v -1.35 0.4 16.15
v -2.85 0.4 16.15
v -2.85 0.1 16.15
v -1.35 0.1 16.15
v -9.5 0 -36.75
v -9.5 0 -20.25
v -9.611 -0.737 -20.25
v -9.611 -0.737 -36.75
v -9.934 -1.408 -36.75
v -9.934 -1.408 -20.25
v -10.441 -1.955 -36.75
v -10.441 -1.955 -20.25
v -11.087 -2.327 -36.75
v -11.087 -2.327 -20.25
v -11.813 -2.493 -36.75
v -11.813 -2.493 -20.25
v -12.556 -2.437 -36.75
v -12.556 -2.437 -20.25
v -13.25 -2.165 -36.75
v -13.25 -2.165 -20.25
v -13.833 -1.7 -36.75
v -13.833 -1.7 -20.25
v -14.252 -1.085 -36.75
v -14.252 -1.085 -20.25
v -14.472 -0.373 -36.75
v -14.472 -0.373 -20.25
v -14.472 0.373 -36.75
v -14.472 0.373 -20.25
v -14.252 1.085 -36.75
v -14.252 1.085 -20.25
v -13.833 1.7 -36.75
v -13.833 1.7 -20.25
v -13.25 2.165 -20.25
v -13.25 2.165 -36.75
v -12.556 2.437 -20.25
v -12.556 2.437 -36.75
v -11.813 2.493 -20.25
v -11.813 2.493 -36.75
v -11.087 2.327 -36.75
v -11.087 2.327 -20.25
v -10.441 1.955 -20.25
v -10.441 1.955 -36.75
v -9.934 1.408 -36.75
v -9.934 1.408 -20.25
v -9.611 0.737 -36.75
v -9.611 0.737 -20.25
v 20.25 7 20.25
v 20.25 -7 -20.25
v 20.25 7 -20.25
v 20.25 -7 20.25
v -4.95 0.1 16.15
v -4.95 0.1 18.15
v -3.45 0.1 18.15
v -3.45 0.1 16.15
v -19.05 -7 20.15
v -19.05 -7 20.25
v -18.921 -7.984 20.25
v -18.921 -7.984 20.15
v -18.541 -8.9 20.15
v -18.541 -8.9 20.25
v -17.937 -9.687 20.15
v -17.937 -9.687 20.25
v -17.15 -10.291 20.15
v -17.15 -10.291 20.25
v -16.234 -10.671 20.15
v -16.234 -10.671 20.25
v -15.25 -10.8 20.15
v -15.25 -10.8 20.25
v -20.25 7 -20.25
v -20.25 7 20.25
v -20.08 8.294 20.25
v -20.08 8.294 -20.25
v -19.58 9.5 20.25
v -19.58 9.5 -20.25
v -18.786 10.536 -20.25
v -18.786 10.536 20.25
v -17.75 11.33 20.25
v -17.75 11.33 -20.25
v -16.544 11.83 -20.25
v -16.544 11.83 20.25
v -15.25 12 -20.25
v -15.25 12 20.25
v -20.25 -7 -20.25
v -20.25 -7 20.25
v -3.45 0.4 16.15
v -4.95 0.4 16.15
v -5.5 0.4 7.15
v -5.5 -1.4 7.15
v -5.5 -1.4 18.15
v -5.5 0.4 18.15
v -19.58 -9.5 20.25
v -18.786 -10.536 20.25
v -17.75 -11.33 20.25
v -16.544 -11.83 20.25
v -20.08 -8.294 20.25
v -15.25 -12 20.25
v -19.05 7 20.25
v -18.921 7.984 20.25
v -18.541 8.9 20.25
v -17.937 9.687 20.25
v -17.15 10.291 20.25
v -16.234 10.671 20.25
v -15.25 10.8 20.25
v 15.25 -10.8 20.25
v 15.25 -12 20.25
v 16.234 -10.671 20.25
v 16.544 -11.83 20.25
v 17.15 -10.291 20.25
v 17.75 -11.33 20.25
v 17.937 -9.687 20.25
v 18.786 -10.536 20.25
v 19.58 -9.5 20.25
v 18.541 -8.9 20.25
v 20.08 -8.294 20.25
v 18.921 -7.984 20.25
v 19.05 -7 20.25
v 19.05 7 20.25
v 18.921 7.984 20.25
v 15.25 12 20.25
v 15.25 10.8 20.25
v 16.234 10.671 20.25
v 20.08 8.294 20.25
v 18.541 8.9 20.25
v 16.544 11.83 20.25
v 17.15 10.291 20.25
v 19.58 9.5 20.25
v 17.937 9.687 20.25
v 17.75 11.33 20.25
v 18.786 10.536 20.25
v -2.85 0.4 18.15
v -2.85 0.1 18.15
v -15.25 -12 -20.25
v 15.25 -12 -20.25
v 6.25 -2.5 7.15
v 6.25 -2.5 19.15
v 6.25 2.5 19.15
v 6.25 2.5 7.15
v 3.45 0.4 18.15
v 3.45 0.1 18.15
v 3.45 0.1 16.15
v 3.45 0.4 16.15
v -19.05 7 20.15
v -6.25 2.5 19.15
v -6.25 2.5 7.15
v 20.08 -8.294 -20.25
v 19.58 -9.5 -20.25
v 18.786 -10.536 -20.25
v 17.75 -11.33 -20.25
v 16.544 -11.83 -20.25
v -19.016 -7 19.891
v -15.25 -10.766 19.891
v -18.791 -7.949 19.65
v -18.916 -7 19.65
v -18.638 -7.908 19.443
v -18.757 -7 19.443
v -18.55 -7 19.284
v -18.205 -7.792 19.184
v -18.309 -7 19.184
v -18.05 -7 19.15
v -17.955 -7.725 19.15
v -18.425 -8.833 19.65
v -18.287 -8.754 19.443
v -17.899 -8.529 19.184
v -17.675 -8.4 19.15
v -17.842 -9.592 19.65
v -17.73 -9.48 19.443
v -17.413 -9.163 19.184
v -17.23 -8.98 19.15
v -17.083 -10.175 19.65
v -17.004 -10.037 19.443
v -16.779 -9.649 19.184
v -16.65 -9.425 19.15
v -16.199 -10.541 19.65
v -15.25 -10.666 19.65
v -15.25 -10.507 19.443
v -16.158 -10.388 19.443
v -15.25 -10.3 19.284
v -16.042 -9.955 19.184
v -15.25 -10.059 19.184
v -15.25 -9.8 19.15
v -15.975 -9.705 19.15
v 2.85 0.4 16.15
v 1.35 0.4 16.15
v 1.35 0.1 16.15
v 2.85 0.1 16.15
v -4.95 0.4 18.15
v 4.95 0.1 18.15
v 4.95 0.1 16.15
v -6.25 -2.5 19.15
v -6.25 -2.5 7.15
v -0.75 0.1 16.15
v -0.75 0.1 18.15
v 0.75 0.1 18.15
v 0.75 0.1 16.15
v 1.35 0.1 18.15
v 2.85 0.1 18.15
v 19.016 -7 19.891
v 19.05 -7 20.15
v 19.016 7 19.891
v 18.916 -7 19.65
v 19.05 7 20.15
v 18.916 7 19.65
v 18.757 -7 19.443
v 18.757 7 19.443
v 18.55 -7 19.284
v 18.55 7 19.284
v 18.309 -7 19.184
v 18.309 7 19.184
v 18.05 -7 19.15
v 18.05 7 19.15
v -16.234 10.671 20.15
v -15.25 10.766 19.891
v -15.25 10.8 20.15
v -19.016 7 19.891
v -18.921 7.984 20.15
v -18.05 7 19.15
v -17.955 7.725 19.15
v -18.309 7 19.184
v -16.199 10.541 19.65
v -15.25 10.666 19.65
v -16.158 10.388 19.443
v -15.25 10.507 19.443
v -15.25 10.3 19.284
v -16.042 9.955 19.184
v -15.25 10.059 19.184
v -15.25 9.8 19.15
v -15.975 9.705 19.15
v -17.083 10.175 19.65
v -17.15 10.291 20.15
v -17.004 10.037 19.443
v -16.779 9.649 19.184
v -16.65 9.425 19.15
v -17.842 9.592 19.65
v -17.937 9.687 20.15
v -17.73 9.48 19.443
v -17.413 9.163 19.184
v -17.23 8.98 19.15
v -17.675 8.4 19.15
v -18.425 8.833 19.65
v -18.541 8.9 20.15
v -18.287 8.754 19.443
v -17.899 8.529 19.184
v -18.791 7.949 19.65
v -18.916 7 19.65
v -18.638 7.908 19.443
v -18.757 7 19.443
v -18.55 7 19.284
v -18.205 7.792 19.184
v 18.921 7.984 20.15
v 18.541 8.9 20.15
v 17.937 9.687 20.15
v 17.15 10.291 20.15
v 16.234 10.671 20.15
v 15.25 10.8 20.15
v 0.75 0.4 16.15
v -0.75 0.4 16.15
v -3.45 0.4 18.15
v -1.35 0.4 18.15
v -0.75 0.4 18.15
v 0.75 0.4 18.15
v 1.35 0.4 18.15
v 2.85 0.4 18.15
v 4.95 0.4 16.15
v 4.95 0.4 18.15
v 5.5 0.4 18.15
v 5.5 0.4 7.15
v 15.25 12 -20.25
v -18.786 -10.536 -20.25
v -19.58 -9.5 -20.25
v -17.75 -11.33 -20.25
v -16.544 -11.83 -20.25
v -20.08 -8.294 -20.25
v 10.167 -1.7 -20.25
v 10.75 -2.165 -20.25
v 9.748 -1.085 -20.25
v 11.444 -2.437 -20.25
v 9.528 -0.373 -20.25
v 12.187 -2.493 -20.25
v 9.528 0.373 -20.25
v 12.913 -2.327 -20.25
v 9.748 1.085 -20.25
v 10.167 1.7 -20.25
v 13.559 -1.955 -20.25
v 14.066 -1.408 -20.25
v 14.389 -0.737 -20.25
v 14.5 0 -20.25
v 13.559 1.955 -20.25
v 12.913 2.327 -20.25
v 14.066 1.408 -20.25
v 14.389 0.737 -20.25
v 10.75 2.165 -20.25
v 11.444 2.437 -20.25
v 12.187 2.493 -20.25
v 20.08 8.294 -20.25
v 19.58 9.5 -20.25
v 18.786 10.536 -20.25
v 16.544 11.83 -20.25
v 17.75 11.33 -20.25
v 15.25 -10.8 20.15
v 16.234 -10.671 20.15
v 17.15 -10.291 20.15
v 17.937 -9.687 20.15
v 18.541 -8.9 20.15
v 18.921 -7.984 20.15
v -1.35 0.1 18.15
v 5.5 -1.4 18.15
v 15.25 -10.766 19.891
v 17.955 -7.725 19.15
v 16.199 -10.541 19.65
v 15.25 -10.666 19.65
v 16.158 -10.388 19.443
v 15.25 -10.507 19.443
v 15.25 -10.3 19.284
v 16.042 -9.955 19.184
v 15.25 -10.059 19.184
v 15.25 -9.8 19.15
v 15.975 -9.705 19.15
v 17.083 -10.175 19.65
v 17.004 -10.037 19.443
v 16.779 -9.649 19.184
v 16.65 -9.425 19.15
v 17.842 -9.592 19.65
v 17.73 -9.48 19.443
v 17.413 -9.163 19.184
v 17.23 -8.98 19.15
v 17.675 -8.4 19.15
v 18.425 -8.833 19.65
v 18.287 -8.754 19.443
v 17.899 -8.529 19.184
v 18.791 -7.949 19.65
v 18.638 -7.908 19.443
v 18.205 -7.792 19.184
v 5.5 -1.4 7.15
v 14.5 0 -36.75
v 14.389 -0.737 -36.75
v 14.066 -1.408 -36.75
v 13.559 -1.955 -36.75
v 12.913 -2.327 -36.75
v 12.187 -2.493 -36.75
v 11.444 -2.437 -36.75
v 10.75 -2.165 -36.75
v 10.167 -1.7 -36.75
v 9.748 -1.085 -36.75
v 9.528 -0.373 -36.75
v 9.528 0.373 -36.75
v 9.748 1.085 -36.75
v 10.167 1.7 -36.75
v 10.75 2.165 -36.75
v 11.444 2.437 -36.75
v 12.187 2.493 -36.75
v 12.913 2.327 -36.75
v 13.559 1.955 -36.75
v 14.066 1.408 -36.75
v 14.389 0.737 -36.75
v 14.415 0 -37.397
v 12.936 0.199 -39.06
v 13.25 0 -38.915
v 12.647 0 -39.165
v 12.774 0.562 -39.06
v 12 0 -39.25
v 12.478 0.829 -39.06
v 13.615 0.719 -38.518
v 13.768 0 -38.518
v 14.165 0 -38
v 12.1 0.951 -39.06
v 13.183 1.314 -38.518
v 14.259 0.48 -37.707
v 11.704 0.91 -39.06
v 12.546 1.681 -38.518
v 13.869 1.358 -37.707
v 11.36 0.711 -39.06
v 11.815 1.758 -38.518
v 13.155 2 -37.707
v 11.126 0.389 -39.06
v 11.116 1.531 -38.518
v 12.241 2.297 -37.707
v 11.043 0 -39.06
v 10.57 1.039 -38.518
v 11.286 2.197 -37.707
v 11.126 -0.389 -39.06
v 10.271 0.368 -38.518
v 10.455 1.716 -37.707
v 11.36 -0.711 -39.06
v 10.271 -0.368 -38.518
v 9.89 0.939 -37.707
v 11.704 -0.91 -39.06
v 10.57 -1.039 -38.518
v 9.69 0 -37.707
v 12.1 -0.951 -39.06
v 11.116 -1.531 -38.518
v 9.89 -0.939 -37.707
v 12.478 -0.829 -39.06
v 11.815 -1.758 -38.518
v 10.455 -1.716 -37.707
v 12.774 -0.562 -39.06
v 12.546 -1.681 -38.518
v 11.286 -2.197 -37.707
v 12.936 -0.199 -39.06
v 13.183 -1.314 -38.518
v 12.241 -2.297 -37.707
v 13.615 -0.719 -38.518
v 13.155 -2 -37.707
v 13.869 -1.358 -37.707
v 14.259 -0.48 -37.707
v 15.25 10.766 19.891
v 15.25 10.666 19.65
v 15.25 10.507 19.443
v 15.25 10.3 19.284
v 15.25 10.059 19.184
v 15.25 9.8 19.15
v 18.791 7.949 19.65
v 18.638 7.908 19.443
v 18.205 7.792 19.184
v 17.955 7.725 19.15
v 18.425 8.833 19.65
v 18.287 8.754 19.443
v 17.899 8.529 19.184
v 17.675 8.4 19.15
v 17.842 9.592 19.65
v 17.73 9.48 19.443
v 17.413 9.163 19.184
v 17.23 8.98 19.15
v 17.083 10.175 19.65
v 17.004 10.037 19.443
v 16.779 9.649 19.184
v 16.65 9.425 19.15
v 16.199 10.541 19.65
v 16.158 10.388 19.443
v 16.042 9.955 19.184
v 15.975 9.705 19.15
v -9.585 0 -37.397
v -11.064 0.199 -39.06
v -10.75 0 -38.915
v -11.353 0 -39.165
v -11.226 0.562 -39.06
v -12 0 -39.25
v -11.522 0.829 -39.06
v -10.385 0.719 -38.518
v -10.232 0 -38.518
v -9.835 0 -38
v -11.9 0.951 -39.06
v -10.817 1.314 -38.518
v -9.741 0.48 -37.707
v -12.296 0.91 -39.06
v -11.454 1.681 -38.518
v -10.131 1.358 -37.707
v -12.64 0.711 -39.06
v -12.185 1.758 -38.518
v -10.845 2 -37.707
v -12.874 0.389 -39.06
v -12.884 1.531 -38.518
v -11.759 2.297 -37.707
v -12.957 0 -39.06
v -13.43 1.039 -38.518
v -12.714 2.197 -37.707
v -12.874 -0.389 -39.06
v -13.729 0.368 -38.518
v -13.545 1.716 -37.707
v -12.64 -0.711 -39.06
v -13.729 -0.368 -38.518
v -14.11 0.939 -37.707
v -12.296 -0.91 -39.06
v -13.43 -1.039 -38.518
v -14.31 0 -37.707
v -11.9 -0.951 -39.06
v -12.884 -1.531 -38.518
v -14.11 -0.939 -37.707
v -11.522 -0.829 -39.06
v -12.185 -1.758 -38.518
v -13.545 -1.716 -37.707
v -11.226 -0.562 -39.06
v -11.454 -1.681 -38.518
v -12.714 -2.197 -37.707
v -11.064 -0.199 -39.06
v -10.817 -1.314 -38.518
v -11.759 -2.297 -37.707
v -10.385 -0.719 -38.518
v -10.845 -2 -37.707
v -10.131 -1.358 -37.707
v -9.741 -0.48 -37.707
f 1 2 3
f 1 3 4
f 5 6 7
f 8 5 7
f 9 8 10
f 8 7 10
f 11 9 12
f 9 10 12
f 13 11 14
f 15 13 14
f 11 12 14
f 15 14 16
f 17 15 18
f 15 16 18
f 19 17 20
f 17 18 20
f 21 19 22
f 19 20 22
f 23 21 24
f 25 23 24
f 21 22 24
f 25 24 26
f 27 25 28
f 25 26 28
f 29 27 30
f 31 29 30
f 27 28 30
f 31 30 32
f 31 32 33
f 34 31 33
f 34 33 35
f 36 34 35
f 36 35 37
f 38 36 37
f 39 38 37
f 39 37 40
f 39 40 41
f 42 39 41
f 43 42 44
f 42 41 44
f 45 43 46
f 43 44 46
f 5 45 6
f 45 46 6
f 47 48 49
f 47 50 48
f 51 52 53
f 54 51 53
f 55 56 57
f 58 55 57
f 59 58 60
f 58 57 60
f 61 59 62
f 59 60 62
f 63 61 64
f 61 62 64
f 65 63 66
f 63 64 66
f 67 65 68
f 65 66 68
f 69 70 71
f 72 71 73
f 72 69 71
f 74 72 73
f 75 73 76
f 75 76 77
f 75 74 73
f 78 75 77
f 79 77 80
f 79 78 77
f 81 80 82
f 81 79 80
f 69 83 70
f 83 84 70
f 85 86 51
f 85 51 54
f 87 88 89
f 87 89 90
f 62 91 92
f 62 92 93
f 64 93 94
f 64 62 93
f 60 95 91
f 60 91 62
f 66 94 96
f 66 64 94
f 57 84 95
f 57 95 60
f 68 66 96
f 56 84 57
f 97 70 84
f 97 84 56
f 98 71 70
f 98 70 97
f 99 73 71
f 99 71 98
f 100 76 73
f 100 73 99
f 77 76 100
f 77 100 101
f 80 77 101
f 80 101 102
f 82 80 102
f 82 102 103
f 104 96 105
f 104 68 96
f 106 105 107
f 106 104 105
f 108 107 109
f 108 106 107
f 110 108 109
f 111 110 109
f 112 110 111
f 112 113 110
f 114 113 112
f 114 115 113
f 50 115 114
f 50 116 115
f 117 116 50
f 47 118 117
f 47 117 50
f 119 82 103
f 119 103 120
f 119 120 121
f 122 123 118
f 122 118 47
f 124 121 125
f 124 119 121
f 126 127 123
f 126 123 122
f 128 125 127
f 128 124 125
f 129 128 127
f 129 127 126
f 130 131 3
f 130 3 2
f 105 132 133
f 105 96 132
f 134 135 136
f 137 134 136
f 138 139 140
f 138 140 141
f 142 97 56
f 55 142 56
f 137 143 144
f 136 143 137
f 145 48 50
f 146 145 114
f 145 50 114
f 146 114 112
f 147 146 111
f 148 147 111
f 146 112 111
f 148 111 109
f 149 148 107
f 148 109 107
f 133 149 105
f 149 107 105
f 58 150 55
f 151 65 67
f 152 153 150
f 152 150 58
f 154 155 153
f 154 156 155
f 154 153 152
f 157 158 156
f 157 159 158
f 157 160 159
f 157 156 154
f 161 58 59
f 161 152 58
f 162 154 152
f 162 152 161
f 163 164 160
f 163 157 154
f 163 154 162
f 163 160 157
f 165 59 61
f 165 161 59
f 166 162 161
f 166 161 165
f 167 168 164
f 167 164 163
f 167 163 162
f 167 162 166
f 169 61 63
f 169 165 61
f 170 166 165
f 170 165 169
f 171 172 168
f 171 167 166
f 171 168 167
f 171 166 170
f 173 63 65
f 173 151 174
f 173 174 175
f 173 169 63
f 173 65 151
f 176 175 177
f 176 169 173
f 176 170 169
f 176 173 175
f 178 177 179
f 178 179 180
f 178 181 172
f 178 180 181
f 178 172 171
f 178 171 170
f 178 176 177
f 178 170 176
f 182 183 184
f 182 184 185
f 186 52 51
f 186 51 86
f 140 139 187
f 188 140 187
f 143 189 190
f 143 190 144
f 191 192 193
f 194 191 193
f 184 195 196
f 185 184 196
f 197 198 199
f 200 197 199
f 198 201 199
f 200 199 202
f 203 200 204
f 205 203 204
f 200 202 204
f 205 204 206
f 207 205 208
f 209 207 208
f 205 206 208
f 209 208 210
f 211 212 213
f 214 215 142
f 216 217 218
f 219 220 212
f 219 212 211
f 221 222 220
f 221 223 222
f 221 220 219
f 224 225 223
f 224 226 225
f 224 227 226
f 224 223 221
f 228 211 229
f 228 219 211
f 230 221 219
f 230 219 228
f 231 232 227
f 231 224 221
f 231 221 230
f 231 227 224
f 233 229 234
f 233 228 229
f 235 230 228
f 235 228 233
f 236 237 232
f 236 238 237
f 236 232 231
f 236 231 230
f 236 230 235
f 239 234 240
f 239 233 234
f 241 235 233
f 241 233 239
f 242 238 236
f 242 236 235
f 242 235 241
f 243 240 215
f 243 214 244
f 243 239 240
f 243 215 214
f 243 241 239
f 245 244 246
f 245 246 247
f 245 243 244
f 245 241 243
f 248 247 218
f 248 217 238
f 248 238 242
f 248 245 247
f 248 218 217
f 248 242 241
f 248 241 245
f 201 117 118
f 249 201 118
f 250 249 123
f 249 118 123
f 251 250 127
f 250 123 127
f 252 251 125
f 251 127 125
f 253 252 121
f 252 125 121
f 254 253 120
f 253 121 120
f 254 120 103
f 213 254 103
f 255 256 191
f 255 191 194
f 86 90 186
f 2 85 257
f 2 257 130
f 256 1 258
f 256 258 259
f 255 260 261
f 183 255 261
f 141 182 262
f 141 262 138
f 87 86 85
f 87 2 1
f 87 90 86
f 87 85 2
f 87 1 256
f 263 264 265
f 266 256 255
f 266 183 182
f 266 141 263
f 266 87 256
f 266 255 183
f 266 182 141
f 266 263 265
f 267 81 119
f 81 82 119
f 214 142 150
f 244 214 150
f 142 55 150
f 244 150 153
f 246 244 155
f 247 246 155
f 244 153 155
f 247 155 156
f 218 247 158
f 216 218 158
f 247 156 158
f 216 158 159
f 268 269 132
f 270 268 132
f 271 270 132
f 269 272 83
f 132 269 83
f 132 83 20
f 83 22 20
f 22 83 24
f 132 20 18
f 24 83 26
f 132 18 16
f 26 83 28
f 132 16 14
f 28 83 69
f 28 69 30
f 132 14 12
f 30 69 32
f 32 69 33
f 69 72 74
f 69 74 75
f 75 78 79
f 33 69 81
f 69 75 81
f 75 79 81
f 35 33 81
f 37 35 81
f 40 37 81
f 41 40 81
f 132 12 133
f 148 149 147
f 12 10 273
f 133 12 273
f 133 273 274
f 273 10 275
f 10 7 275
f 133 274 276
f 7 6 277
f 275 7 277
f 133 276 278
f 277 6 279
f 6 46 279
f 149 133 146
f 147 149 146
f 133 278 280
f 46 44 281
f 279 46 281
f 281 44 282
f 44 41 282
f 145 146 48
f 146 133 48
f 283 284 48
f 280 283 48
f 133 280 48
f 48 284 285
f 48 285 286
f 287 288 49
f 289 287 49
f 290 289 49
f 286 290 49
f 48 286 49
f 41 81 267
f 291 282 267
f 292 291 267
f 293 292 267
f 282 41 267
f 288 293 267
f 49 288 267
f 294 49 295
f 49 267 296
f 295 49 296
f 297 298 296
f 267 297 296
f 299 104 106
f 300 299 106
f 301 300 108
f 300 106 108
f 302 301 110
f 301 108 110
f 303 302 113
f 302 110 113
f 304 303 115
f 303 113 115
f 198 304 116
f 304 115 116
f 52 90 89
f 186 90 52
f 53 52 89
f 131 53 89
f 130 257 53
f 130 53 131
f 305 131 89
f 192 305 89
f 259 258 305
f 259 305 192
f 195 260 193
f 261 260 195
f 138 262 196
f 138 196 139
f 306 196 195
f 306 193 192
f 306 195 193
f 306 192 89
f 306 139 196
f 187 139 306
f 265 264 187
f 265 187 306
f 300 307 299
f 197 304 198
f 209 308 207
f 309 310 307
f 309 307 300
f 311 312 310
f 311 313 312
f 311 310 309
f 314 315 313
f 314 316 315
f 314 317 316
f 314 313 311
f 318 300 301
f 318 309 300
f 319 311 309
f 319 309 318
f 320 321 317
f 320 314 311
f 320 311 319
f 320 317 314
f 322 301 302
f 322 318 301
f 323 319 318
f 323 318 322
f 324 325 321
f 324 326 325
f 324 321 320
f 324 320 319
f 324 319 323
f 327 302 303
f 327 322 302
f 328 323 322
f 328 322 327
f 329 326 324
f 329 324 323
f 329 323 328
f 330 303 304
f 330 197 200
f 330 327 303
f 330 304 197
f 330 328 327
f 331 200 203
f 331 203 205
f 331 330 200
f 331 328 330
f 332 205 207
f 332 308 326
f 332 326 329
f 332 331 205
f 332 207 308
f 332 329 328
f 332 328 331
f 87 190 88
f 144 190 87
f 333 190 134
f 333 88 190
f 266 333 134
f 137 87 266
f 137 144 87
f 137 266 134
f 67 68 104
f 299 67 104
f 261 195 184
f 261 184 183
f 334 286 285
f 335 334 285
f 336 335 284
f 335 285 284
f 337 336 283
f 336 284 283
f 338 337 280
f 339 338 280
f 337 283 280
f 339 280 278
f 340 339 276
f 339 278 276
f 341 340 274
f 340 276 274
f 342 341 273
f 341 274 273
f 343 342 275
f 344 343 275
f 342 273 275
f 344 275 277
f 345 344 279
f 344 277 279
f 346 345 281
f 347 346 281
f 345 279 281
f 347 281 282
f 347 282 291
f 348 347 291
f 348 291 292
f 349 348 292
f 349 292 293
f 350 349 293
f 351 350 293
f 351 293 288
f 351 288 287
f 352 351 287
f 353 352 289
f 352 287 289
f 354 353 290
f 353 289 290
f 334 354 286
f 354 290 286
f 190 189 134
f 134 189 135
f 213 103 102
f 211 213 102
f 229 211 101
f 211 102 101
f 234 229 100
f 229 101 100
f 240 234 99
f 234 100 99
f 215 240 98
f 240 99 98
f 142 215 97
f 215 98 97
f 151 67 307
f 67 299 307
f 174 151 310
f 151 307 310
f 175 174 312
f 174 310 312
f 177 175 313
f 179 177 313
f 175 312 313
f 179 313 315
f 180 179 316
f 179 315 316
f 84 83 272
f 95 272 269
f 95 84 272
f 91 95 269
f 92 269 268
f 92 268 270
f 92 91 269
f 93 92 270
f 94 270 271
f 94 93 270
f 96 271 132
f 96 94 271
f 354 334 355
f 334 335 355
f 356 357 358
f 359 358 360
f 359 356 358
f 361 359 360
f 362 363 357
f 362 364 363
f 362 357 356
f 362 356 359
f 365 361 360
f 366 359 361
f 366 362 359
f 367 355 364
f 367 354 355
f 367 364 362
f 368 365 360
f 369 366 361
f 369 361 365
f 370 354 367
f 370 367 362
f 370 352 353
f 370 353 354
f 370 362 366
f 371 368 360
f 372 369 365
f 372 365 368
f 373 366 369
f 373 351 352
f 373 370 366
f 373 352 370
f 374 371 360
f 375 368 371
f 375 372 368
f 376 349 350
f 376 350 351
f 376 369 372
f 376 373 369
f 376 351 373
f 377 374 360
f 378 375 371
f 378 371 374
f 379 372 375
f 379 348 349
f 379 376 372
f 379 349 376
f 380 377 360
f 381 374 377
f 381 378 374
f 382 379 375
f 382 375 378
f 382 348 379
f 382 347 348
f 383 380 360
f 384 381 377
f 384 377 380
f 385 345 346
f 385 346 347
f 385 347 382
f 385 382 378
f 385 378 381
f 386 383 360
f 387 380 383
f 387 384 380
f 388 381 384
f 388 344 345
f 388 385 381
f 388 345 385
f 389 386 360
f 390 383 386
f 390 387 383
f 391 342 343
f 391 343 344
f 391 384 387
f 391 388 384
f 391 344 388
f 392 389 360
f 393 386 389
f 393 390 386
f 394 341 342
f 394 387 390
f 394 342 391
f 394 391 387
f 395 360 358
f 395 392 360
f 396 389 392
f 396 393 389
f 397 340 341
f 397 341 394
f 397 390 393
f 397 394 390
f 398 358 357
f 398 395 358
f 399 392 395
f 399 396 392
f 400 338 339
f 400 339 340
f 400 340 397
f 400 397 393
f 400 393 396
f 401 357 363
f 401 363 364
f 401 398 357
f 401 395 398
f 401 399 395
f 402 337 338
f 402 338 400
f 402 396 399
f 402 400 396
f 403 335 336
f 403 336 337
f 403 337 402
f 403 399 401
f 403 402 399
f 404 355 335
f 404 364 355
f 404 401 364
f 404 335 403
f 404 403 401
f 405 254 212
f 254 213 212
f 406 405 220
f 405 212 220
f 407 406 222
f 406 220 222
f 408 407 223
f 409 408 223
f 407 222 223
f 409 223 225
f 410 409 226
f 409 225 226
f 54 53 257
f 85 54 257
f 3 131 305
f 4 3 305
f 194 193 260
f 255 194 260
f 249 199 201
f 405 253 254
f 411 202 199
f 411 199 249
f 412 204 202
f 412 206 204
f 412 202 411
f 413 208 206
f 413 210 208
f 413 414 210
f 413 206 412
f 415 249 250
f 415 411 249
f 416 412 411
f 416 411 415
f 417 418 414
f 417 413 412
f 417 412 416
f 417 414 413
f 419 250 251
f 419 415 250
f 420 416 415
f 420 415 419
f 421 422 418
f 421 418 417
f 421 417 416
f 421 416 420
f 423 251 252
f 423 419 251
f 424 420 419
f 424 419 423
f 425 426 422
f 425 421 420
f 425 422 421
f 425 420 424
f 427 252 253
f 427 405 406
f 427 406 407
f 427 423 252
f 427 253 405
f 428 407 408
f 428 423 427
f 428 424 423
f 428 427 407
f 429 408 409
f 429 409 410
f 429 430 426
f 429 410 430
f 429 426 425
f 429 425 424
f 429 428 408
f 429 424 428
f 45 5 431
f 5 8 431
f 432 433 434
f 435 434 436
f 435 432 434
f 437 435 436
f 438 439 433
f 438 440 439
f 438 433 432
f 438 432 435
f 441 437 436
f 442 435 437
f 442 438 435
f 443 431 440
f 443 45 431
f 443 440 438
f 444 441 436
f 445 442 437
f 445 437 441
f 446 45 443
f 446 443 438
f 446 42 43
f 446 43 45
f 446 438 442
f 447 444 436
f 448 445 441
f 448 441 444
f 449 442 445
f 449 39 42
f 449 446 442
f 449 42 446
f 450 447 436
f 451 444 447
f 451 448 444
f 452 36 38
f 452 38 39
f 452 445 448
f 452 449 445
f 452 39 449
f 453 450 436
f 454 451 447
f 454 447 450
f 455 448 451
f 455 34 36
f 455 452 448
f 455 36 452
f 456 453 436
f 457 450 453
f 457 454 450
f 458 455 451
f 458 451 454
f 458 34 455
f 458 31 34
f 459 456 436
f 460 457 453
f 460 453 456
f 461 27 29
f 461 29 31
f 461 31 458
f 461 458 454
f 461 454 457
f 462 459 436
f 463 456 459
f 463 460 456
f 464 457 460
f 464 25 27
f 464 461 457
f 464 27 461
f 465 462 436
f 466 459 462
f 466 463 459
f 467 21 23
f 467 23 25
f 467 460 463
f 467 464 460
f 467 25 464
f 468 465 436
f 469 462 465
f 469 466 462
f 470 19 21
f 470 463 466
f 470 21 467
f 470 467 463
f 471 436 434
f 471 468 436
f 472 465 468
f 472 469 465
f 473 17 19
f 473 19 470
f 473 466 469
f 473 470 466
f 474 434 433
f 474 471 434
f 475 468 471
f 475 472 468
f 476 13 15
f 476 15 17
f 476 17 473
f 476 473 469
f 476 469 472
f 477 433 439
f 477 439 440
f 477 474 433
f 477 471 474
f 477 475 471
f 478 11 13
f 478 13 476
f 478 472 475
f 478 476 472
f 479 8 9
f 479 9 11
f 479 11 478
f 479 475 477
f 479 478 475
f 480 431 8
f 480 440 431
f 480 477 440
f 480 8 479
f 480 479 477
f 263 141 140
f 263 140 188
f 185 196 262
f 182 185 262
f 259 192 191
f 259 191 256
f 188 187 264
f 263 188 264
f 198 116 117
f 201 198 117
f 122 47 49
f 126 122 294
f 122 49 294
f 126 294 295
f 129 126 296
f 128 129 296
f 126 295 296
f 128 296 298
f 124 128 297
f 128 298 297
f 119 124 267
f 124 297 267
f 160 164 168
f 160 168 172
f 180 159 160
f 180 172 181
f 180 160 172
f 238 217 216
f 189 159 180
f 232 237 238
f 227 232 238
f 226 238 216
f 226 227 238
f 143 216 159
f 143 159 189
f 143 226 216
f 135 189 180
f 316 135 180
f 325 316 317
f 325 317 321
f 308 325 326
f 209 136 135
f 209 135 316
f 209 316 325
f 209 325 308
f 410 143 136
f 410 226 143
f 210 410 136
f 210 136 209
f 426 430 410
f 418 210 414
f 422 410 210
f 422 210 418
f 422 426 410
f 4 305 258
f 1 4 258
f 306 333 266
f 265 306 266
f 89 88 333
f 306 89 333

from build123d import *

# Parameters (mm, degrees)
SKETCH1_W           = 40.5
SKETCH1_H           = 24
BOSS_EXTRUDE1_DEPTH = 20.25
FILLET1_R           = 5
CUT_EXTRUDE7_DEPTH  = 1.1
FILLET2_R           = 1
SKETCH14_R          = 2.5
BOSS_EXTRUDE3_DEPTH = 16.5
SKETCH15_W          = 12.5
SKETCH15_H          = 5
CUT_EXTRUDE8_DEPTH  = 12
SKETCH17_W          = 11
SKETCH17_H          = 1.8
BOSS_EXTRUDE4_DEPTH = 11
SKETCH18_W          = 1.5
SKETCH18_H          = 0.4
CUT_EXTRUDE9_DEPTH  = 2
LPATTERN1_COUNT     = 3
LPATTERN1_PITCH     = 2.1
LPATTERN1_COL_COUNT = 3
LPATTERN1_COL_PITCH = 2.1


# Read off the part's stored shape, not the designer's step: Dome1, Dome2
with BuildPart() as part:
    # Sketch1 → Boss-Extrude1 (new, symmetric)
    with BuildSketch(Plane.XY):
        Rectangle(SKETCH1_W, SKETCH1_H)
    extrude(amount=BOSS_EXTRUDE1_DEPTH, both=True)

    # Fillet1
    fillet1_edges = [part.edges().sort_by_distance(p)[0] for p in [
        (20.25, -12, 0),
        (-20.25, -12, 0),
        (-20.25, 12, 0),
        (20.25, 12, 0),
    ]]
    fillet(fillet1_edges, radius=FILLET1_R)

    # Sketch13 → Cut-Extrude7 (cut)
    with BuildSketch(Plane.XY.offset(20.25)):
        with BuildLine():
            Line((-19.05, 7), (-19.05, -7))
            ThreePointArc((-19.05, -7), (-17.937005769, -9.687005769), (-15.25, -10.8))
            Line((-15.25, -10.8), (15.25, -10.8))
            ThreePointArc((15.25, -10.8), (17.937005769, -9.687005769), (19.05, -7))
            Line((19.05, -7), (19.05, 7))
            ThreePointArc((19.05, 7), (17.937005769, 9.687005769), (15.25, 10.8))
            Line((15.25, 10.8), (-15.25, 10.8))
            ThreePointArc((-15.25, 10.8), (-17.937005769, 9.687005769), (-19.05, 7))
        make_face()
    extrude(amount=-CUT_EXTRUDE7_DEPTH, mode=Mode.SUBTRACT)

    # Fillet2
    fillet2_edges = [part.edges().sort_by_distance(p)[0] for p in [
        (-19.05, 0, 19.15),
        (-17.937005769, 9.687005769, 19.15),
        (0, 10.8, 19.15),
        (17.937005769, 9.687005769, 19.15),
        (19.05, 0, 19.15),
        (17.937005769, -9.687005769, 19.15),
        (0, -10.8, 19.15),
        (-17.937005769, -9.687005769, 19.15),
    ]]
    fillet(fillet2_edges, radius=FILLET2_R)

    # Sketch14 → Boss-Extrude3 (add)
    with BuildSketch(Plane(origin=(0, 0, -20.25), x_dir=(-1, 0, 0), z_dir=(0, 0, -1))):
        with Locations(Location((-12, 0, 0), (0, 0, 180))):
            Circle(SKETCH14_R)
        with Locations(Location((12, 0, 0), (0, 0, 180))):
            Circle(SKETCH14_R)
    extrude(amount=BOSS_EXTRUDE3_DEPTH)

    # Dome1 outline → Dome1 (revolve)
    with BuildSketch(Plane(origin=(12, 0, 0), x_dir=(1, 0, 0), z_dir=(0, -1, 0))):
        with BuildLine():
            Line((0, -36.749999997), (0, -39.25))
            ThreePointArc((0, -39.25), (1.767766954, -38.517766952), (2.5, -36.749999997))
            Line((2.5, -36.749999997), (0, -36.749999997))
        make_face()
    revolve(axis=Axis((12, 0, 0), (0, 0, 1)))

    # Dome2 outline → Dome2 (revolve)
    with BuildSketch(Plane(origin=(-12, 0, 0), x_dir=(1, 0, 0), z_dir=(0, -1, 0))):
        with BuildLine():
            Line((0, -36.749999997), (0, -39.25))
            ThreePointArc((0, -39.25), (1.767766954, -38.517766952), (2.5, -36.749999997))
            Line((2.5, -36.749999997), (0, -36.749999997))
        make_face()
    revolve(axis=Axis((-12, 0, 0), (0, 0, 1)))

    # Sketch15 → Cut-Extrude8 (cut)
    with BuildSketch(Plane.XY.offset(19.15)):
        Rectangle(SKETCH15_W, SKETCH15_H)
    extrude(amount=-CUT_EXTRUDE8_DEPTH, mode=Mode.SUBTRACT)

    # Sketch17 → Boss-Extrude4 (add)
    with BuildSketch(Plane.XY.offset(7.15)):
        with Locations((0, -0.5)):
            Rectangle(SKETCH17_W, SKETCH17_H)
    extrude(amount=BOSS_EXTRUDE4_DEPTH)

    # Sketch18 → Cut-Extrude9 (cut)
    with BuildSketch(Plane.XY.offset(18.15)):
        with Locations((0, 0.3)):
            Rectangle(SKETCH18_W, SKETCH18_H)
    cut_extrude9 = extrude(amount=-CUT_EXTRUDE9_DEPTH, mode=Mode.SUBTRACT)

    # LPattern1: Cut-Extrude9 ×3
    with Locations(*[(i * LPATTERN1_PITCH, 0, 0) for i in range(1, LPATTERN1_COUNT)]):
        add(cut_extrude9, mode=Mode.SUBTRACT)

    # LPattern1 col: Cut-Extrude9 ×3
    with Locations(*[(-i * LPATTERN1_COL_PITCH, 0, 0) for i in range(1, LPATTERN1_COL_COUNT)]):
        add(cut_extrude9, mode=Mode.SUBTRACT)


solid = part.part
